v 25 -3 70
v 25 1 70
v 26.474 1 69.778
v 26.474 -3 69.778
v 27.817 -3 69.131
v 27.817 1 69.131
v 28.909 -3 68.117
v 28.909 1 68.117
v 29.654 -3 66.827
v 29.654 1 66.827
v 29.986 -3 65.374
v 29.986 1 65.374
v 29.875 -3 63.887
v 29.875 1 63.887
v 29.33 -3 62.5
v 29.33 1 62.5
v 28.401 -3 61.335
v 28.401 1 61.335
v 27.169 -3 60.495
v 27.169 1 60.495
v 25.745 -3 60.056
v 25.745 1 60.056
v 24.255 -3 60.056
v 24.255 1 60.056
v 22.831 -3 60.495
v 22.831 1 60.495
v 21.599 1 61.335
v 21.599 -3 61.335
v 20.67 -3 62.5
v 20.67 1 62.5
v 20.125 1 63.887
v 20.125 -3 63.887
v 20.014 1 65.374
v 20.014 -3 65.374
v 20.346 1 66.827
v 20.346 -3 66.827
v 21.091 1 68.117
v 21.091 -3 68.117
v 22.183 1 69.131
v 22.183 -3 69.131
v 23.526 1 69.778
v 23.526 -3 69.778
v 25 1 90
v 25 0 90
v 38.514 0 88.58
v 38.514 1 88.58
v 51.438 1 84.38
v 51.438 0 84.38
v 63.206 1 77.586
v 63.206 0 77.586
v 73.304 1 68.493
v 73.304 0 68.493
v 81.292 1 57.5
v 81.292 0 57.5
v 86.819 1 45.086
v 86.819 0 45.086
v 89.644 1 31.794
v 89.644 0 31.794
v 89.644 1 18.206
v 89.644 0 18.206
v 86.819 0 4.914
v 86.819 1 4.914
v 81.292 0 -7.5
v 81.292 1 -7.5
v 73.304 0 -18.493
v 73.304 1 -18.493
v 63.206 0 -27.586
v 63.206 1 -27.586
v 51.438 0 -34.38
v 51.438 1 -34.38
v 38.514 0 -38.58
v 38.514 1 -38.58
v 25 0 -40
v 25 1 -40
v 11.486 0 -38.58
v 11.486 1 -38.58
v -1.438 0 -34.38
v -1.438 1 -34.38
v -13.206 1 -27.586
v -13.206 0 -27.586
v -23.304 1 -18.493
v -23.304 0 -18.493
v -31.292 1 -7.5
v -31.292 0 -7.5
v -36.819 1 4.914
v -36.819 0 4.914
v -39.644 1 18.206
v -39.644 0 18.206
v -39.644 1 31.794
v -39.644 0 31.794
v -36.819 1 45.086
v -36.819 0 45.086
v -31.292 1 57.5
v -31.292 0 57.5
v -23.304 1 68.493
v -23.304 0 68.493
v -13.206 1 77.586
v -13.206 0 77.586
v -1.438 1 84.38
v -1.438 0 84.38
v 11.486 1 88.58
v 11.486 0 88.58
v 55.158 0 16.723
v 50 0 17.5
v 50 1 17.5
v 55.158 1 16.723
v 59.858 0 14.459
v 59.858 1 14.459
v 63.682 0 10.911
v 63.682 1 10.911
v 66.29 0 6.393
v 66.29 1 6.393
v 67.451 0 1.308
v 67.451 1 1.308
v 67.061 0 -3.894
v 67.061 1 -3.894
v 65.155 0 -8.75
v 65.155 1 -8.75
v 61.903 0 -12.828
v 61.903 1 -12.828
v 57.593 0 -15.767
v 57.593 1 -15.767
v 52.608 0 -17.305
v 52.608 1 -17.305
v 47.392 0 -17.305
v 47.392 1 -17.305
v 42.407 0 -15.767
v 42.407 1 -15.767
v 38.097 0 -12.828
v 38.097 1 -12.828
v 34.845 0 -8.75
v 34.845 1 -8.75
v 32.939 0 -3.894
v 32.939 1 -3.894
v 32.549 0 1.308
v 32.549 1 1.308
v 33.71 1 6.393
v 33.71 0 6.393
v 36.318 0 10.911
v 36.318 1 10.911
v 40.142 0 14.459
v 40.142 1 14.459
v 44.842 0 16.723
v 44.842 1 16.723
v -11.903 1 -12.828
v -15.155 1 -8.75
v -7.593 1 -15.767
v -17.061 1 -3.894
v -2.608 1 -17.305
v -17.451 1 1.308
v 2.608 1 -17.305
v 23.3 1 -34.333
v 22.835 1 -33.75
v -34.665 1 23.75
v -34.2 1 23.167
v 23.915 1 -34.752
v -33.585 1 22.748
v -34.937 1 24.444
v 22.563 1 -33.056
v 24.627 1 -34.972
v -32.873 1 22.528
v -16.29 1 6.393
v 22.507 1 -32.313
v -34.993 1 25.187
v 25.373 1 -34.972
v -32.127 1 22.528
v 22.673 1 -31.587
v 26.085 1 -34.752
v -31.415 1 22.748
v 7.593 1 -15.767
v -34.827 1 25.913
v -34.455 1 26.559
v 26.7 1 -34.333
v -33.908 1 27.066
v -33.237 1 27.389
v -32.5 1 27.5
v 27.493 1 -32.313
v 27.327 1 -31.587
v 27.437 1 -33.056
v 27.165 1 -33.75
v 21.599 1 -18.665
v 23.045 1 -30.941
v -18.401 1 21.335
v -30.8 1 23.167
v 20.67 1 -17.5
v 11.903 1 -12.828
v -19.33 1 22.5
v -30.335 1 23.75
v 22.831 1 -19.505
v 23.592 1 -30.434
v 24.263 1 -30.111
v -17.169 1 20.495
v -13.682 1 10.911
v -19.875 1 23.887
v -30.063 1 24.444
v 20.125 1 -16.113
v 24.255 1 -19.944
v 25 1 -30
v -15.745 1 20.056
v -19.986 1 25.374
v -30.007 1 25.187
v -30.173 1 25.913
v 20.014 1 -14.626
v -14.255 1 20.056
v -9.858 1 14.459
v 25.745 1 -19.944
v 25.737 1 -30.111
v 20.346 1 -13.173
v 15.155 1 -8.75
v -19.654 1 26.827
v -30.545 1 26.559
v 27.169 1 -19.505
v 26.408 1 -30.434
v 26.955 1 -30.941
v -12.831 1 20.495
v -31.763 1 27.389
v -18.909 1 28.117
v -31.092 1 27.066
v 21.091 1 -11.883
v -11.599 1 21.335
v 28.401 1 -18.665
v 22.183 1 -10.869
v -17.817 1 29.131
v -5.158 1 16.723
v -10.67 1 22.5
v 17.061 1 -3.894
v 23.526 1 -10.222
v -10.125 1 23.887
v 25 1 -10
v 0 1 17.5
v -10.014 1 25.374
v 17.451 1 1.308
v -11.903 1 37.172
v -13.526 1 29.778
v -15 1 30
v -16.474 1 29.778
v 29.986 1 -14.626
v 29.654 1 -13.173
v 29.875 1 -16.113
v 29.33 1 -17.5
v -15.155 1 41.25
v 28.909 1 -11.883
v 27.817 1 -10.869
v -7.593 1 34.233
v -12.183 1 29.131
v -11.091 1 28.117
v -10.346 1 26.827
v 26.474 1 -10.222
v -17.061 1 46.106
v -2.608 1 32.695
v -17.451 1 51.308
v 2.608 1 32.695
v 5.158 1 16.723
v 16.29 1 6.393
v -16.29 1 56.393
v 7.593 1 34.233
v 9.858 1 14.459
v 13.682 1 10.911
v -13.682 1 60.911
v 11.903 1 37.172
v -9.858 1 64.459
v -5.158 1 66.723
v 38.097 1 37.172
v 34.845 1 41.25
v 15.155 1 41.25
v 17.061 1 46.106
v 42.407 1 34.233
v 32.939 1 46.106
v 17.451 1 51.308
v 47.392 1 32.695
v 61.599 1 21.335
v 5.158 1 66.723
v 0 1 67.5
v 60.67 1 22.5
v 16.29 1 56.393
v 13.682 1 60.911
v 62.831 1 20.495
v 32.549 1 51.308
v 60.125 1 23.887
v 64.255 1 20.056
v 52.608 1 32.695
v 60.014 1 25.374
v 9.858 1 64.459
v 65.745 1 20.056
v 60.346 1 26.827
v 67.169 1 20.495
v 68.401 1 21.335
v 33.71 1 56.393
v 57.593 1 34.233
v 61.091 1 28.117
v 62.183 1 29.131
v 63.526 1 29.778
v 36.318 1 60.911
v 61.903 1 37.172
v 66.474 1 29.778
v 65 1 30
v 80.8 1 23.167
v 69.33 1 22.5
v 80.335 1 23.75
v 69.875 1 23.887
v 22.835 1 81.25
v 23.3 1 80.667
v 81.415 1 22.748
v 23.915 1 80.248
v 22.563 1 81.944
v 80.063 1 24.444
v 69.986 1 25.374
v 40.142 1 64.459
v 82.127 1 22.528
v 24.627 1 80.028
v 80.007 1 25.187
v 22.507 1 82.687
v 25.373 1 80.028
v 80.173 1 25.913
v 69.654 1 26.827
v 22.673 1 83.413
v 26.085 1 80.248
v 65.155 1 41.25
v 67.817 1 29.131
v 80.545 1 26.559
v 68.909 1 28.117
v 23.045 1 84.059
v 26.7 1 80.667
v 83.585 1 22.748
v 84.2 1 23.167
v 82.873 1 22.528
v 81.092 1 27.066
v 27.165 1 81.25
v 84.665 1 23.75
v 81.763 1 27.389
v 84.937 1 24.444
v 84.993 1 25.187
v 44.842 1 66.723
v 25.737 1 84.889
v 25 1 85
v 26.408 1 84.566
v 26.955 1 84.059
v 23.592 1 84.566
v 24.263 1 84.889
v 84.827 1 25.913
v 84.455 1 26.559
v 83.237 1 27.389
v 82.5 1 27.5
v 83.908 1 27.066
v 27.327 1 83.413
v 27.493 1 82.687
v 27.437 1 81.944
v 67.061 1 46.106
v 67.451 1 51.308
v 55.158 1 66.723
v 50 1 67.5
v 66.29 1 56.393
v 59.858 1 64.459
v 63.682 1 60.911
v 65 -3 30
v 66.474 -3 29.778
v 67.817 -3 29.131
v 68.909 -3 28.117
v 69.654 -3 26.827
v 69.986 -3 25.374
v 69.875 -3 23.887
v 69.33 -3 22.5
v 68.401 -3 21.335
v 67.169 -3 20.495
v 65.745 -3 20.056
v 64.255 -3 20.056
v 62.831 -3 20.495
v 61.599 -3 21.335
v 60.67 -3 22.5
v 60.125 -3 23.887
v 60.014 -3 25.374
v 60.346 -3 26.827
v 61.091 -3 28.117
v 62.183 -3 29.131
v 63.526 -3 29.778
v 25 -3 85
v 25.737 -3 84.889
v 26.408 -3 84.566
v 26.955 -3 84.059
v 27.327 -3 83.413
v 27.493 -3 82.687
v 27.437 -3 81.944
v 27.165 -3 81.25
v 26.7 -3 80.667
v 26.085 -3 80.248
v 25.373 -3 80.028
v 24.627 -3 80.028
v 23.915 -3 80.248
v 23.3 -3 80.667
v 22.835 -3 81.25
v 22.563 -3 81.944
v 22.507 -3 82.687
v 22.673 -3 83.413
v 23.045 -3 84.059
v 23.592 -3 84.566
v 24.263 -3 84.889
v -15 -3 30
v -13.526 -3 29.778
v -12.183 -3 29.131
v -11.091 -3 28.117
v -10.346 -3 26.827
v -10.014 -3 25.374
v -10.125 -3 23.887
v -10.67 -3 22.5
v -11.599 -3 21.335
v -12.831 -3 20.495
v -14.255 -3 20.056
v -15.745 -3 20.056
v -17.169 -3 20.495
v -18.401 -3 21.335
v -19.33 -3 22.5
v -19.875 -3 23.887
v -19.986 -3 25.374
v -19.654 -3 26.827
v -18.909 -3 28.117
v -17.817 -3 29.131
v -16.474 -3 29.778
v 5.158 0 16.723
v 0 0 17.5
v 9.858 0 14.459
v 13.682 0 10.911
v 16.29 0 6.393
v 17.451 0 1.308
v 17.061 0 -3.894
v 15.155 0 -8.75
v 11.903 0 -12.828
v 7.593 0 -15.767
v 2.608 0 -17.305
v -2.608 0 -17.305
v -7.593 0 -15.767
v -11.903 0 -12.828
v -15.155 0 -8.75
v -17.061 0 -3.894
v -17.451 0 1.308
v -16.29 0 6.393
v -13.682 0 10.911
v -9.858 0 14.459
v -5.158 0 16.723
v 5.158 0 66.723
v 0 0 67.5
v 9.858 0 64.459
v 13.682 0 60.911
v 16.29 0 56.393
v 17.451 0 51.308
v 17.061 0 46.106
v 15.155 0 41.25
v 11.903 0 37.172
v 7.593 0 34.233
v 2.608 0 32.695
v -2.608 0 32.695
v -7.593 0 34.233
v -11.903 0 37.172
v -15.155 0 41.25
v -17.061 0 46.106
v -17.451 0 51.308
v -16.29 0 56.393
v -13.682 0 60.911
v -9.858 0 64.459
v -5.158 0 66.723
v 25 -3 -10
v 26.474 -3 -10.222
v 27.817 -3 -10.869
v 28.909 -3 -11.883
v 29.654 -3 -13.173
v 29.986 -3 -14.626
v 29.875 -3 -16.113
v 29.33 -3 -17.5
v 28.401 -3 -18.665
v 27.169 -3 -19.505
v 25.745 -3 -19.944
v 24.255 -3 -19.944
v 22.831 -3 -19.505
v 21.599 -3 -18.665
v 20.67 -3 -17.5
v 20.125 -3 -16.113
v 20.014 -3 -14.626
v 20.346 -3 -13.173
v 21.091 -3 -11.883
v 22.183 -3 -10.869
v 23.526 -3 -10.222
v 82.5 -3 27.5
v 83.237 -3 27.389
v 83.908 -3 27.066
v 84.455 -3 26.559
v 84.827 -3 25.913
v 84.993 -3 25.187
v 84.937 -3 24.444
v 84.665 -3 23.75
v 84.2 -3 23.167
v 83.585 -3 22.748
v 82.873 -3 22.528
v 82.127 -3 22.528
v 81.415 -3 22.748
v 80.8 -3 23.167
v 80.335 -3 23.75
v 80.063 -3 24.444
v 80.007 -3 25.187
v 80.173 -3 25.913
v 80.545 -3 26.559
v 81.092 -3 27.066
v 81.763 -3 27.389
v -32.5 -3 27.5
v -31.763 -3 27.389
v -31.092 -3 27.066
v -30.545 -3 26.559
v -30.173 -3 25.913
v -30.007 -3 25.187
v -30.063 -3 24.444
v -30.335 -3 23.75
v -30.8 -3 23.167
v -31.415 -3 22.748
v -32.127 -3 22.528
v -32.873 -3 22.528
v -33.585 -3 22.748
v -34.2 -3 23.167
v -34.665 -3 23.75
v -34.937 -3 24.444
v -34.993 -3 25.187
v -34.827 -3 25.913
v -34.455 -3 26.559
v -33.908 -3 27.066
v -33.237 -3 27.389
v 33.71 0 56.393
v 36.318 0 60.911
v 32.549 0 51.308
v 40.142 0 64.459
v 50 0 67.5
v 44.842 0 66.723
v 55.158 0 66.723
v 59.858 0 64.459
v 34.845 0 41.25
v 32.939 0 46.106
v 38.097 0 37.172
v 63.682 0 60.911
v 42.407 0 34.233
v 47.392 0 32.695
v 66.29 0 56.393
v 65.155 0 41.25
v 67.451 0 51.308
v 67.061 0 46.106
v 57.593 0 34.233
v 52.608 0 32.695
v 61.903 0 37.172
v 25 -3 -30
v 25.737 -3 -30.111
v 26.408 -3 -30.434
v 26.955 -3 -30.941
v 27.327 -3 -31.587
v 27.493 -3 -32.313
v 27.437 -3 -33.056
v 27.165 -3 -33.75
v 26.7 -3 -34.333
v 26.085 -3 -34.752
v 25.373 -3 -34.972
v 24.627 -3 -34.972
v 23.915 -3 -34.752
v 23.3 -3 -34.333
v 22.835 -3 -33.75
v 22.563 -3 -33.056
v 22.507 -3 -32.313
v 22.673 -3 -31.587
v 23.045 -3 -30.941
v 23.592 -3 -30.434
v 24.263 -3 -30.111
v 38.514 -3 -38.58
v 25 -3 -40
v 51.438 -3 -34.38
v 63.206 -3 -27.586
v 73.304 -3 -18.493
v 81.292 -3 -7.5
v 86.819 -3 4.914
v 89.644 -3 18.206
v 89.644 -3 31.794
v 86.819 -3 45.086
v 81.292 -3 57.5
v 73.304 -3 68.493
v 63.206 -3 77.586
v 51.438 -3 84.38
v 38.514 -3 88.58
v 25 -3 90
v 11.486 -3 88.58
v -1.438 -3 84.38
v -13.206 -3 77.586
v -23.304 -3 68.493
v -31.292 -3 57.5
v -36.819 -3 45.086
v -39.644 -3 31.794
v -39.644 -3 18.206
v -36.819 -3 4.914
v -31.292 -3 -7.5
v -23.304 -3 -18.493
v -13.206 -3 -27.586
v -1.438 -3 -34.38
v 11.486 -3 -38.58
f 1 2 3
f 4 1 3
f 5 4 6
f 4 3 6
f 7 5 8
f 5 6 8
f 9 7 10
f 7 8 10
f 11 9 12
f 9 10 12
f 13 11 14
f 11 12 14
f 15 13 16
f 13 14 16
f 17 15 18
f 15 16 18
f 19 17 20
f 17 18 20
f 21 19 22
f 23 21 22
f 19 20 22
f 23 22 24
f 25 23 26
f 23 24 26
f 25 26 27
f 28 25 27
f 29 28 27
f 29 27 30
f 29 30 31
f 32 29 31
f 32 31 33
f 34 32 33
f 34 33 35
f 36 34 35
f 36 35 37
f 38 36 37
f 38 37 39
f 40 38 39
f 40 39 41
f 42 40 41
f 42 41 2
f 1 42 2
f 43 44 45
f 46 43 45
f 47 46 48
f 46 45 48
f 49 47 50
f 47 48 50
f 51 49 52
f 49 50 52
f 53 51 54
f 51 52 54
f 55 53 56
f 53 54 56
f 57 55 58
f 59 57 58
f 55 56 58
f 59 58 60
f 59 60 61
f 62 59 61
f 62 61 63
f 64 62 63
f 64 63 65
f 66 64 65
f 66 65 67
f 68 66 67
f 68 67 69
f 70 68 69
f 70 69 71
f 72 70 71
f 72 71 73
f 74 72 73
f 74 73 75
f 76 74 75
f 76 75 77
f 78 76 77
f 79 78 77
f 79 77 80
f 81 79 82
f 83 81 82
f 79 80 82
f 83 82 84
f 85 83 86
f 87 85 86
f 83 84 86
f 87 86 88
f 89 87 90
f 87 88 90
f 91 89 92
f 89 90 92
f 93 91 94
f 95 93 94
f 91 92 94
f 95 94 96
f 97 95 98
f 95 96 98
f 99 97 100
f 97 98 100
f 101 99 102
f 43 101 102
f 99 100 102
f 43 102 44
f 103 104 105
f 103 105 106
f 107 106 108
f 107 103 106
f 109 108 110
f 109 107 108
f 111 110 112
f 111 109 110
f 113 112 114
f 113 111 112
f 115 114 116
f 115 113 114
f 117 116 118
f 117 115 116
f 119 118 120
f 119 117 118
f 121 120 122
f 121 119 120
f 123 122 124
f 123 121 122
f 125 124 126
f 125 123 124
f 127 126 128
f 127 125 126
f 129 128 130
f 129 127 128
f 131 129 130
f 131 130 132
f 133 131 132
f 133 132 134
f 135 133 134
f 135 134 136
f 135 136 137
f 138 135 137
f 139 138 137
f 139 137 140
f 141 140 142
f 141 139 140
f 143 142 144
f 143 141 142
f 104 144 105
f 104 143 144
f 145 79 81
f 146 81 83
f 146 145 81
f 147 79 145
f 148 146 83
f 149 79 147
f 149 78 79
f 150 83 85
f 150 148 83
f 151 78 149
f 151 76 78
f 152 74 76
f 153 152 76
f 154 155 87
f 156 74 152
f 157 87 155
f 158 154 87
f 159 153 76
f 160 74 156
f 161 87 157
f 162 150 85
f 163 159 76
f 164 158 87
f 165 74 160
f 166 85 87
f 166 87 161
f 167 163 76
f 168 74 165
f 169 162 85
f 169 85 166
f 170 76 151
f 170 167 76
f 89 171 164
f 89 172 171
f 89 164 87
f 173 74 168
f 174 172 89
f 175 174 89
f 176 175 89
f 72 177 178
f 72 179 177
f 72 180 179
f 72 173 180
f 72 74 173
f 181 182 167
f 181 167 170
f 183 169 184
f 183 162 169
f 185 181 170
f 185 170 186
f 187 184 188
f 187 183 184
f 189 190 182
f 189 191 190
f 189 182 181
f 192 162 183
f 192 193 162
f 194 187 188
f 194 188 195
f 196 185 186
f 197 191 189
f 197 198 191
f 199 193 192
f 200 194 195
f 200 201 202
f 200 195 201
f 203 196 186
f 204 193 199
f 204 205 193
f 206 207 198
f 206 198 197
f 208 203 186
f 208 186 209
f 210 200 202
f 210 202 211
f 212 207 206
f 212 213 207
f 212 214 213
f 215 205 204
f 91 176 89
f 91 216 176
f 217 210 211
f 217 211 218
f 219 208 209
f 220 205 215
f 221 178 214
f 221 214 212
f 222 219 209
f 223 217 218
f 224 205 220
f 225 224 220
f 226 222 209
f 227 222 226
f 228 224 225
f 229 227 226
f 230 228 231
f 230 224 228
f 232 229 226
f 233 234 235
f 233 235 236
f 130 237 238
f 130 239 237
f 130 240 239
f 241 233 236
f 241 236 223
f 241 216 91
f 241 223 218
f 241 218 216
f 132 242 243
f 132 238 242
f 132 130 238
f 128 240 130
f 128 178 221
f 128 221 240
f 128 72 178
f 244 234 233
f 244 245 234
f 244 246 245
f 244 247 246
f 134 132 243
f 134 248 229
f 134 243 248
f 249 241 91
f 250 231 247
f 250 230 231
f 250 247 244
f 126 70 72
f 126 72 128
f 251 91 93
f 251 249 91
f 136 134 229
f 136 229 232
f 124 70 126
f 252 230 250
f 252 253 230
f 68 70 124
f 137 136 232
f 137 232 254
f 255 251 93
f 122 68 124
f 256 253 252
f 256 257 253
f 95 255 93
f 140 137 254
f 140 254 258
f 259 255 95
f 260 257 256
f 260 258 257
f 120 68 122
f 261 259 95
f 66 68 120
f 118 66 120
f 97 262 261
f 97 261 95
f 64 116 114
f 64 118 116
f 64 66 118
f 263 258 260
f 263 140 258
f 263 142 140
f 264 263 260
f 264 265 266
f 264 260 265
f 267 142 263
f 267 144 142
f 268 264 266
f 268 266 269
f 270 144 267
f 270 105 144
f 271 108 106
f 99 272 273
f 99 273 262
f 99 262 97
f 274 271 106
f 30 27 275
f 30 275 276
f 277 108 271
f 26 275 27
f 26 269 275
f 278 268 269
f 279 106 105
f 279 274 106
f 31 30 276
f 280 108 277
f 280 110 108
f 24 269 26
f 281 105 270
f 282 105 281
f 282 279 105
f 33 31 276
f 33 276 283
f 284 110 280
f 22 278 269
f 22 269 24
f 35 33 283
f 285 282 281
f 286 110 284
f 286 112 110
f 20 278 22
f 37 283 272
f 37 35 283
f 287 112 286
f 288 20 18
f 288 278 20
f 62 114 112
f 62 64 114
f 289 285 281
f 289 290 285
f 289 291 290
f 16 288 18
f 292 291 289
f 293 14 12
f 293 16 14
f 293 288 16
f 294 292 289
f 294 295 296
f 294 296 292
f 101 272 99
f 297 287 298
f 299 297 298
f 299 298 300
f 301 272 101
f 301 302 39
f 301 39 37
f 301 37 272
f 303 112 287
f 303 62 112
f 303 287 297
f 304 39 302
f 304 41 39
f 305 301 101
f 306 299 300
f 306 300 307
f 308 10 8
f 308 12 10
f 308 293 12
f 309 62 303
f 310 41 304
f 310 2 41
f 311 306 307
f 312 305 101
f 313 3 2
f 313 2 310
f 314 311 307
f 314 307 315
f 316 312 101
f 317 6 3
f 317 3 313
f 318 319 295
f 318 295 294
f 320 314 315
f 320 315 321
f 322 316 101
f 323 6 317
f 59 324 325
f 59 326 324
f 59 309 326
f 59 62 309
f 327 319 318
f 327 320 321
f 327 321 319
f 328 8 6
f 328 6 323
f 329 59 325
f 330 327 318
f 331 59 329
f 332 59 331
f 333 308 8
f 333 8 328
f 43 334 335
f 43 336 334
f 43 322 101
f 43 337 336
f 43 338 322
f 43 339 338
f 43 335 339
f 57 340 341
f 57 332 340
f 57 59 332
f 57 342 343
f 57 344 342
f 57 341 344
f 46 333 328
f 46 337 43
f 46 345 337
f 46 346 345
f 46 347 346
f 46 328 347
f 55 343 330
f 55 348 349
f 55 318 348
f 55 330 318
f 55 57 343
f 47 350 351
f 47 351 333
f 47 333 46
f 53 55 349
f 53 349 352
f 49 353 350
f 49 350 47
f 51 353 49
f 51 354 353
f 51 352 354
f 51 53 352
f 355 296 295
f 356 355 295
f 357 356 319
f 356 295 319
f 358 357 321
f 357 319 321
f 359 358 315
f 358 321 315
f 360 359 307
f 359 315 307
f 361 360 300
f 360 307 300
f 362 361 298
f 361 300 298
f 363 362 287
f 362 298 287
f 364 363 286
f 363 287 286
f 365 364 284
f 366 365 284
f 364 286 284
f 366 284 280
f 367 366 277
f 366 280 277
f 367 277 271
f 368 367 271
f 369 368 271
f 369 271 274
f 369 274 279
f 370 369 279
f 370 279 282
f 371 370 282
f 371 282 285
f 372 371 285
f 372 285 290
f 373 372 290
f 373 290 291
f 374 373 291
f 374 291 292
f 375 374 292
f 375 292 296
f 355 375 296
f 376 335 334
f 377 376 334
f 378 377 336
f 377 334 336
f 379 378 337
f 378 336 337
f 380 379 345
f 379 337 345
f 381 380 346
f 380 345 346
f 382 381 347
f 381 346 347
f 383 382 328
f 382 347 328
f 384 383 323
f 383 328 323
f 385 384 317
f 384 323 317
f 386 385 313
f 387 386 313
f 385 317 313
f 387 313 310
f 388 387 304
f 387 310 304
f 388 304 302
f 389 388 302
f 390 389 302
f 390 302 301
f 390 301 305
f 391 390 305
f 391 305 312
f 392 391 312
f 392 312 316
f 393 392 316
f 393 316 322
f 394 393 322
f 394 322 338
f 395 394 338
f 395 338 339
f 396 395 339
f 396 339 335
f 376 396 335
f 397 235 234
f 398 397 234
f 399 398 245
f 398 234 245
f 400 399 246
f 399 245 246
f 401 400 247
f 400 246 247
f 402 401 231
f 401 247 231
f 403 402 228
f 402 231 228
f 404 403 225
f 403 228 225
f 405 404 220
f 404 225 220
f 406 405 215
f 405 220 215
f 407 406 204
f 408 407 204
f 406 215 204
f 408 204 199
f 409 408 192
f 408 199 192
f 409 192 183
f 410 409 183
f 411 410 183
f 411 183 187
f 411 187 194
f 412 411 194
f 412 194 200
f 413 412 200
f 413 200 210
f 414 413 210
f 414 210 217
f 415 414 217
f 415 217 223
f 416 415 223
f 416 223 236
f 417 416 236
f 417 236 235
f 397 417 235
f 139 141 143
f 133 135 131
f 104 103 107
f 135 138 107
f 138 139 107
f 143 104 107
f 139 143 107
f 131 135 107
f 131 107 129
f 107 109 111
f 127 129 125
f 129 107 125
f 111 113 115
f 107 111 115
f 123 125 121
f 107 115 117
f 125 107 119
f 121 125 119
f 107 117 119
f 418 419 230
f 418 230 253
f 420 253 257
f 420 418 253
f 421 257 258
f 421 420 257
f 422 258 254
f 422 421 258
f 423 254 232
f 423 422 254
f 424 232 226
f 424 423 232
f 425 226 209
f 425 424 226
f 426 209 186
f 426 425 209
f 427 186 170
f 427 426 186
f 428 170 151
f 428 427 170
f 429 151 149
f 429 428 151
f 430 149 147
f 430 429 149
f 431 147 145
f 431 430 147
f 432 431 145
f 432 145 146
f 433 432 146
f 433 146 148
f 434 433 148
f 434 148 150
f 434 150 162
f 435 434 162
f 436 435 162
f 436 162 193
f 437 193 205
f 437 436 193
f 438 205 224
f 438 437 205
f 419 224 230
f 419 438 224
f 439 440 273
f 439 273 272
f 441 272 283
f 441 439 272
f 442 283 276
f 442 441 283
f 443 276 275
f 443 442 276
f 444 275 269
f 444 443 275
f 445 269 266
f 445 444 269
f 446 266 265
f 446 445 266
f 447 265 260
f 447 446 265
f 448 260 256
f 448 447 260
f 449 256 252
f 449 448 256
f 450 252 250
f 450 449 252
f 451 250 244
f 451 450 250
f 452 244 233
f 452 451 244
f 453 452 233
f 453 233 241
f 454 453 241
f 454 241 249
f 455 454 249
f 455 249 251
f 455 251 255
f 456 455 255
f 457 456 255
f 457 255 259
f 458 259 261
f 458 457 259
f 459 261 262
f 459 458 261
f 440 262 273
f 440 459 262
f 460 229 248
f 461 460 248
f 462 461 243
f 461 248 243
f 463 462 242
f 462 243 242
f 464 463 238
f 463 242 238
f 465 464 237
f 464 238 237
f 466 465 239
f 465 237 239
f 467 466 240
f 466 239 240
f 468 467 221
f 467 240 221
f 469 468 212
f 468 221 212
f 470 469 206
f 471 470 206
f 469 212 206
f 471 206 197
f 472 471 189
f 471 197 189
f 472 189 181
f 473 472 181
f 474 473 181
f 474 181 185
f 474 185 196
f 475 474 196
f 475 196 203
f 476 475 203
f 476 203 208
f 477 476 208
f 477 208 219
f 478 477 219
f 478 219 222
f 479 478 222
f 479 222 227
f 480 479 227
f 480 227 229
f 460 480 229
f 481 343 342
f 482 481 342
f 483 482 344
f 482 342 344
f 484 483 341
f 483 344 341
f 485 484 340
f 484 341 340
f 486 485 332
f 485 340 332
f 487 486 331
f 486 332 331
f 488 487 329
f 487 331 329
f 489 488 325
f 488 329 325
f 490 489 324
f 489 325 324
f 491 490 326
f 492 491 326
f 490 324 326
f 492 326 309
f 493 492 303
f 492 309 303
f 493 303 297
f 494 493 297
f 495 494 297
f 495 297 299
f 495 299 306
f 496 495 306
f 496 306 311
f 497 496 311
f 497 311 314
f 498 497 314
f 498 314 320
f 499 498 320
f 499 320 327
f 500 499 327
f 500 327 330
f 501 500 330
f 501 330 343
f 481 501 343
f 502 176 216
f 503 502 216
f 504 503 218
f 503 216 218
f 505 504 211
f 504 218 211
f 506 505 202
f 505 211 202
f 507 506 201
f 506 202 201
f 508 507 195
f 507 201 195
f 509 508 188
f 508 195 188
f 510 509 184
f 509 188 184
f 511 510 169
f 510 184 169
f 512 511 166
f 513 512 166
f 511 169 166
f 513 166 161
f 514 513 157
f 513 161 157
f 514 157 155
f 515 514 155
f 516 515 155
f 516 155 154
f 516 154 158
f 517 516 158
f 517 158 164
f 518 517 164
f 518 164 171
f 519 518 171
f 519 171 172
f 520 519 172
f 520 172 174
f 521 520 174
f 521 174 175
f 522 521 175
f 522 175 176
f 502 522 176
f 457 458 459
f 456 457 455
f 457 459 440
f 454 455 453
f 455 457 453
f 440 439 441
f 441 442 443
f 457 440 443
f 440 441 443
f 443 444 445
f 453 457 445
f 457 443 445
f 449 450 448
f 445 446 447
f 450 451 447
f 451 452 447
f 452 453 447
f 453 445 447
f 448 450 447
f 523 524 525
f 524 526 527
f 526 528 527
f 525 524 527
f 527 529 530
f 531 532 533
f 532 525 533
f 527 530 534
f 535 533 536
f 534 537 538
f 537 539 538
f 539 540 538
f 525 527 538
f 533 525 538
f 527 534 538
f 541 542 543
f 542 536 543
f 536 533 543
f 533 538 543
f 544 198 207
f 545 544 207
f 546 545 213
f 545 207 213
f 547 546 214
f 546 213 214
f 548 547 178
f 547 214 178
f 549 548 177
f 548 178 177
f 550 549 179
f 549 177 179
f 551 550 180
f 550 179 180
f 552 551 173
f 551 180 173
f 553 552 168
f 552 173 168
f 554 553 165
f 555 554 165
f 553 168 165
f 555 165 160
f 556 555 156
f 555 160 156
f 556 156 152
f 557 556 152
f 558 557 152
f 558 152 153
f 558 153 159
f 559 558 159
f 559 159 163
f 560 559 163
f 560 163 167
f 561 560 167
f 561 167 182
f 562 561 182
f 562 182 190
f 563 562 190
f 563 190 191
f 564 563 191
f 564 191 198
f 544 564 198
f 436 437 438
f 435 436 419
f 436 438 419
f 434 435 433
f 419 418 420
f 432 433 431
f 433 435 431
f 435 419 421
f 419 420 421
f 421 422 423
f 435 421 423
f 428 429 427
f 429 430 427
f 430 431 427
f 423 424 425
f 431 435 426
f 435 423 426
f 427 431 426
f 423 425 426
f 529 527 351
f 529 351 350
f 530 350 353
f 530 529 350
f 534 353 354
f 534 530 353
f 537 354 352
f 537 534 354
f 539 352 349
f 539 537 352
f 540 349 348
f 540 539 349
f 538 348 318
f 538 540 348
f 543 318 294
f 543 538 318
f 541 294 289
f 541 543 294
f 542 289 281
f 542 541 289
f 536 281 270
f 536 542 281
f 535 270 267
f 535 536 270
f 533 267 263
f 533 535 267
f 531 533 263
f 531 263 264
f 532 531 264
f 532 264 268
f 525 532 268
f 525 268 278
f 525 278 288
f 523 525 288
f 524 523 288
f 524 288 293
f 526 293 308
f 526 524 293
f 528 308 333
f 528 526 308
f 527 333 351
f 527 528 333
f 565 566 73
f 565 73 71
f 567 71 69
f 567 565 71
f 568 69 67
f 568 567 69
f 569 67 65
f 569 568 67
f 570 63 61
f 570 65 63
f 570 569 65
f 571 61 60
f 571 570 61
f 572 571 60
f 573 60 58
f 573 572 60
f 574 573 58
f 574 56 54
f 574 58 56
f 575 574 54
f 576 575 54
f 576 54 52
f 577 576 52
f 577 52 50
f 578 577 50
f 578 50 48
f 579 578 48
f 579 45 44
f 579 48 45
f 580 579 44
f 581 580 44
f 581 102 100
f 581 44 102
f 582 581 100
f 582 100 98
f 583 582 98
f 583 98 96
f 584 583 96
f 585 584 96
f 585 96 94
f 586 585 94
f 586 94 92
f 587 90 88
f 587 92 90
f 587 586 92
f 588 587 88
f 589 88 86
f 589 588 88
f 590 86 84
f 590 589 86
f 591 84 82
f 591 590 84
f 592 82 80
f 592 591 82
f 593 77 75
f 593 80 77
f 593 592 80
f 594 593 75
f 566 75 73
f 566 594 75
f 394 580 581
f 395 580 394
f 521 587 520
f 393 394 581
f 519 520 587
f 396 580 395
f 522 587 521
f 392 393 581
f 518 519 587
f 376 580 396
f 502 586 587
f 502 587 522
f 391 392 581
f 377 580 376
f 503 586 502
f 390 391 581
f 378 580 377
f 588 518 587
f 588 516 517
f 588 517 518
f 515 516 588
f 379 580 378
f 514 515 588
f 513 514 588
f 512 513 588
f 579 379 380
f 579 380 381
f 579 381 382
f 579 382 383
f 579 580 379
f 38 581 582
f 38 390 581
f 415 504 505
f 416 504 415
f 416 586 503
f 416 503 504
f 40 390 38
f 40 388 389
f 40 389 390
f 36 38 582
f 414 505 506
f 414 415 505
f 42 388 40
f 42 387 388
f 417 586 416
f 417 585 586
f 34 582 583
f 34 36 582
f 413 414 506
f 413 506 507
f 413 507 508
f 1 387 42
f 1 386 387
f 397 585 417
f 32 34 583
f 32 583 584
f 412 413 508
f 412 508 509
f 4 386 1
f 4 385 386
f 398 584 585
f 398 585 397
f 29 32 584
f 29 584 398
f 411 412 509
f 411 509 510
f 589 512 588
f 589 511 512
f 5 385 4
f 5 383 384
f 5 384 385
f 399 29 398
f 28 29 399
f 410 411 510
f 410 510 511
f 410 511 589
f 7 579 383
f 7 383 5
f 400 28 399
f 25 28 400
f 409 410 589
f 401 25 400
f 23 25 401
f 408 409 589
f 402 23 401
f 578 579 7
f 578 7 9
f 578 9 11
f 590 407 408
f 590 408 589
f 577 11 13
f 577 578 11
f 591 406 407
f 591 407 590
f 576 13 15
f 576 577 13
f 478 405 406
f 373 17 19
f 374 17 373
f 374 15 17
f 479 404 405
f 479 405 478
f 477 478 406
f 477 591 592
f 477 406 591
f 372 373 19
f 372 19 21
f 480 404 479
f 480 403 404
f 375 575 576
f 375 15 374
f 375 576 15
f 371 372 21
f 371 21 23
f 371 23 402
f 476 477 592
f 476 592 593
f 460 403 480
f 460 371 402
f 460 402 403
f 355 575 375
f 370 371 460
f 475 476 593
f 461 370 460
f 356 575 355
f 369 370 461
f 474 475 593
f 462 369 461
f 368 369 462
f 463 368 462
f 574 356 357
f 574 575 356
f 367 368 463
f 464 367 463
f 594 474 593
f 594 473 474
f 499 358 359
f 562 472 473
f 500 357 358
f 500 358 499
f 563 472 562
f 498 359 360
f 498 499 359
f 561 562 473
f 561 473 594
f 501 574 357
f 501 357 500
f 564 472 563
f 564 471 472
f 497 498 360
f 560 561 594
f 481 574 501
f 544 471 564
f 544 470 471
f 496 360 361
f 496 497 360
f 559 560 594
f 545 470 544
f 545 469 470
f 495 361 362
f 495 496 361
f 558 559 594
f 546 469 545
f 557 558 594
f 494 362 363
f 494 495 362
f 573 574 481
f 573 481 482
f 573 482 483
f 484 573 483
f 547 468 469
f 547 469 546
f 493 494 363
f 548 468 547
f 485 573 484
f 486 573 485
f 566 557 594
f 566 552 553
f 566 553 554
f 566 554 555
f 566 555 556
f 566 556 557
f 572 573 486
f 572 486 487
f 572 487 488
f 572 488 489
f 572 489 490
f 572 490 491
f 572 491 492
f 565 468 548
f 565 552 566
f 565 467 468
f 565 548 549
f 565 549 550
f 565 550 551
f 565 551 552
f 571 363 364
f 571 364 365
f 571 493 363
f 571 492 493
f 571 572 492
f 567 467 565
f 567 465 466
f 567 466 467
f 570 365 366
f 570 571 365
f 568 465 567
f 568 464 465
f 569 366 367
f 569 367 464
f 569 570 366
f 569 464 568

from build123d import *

# Parameters (mm, degrees)
SKETCH1_R           = 65
SKETCH1_R_2         = 17.5
BOSS_EXTRUDE2_DEPTH = 1
BOSS_EXTRUDE3_START = 3
SKETCH2_R           = 65
BOSS_EXTRUDE3_DEPTH = 3
SKETCH3_R           = 5
CUT_EXTRUDE1_DEPTH  = 128.342059038
SKETCH4_R           = 2.5
CUT_EXTRUDE2_DEPTH  = 128.342059038


with BuildPart() as part:
    # Sketch1 → Boss-Extrude2 (new body)
    with BuildSketch(Plane(origin=(0, 0, 0), x_dir=(1, 0, 0), z_dir=(0, 1, 0))):
        with Locations(Location((25, -25, 0), (0, 0, 270))):
            Circle(SKETCH1_R)
        with Locations(Location((0, 0, 0), (0, 0, 270))):
            Circle(SKETCH1_R_2, mode=Mode.SUBTRACT)
        with Locations(Location((50, 0, 0), (0, 0, 270))):
            Circle(SKETCH1_R_2, mode=Mode.SUBTRACT)
        with Locations(Location((50, -50, 0), (0, 0, 270))):
            Circle(SKETCH1_R_2, mode=Mode.SUBTRACT)
        with Locations(Location((0, -50, 0), (0, 0, 270))):
            Circle(SKETCH1_R_2, mode=Mode.SUBTRACT)
    extrude(amount=BOSS_EXTRUDE2_DEPTH)

    # Sketch2 → Boss-Extrude3 (add)
    with BuildSketch(Plane.XZ.offset(BOSS_EXTRUDE3_START)):
        with Locations(Location((25, 25, 0), (0, 0, 270))):
            Circle(SKETCH2_R)
    extrude(amount=-BOSS_EXTRUDE3_DEPTH)

    # Sketch3 → Cut-Extrude1 (cut, through all)
    with BuildSketch(Plane(origin=(0, 1, 0), x_dir=(1, 0, 0), z_dir=(0, 1, 0))):
        with Locations(Location((25, 15, 0), (0, 0, 270))):
            Circle(SKETCH3_R)
        with Locations(Location((65, -25, 0), (0, 0, 270))):
            Circle(SKETCH3_R)
        with Locations(Location((25, -65, 0), (0, 0, 270))):
            Circle(SKETCH3_R)
        with Locations(Location((-15, -25, 0), (0, 0, 270))):
            Circle(SKETCH3_R)
    extrude(amount=-CUT_EXTRUDE1_DEPTH, mode=Mode.SUBTRACT)

    # Sketch4 → Cut-Extrude2 (cut, through all)
    with BuildSketch(Plane(origin=(0, 1, 0), x_dir=(1, 0, 0), z_dir=(0, 1, 0))):
        with Locations(Location((25, 32.5, 0), (0, 0, 270))):
            Circle(SKETCH4_R)
        with Locations(Location((82.5, -25, 0), (0, 0, 270))):
            Circle(SKETCH4_R)
        with Locations(Location((25, -82.5, 0), (0, 0, 270))):
            Circle(SKETCH4_R)
        with Locations(Location((-32.5, -25, 0), (0, 0, 270))):
            Circle(SKETCH4_R)
    extrude(amount=-CUT_EXTRUDE2_DEPTH, mode=Mode.SUBTRACT)


solid = part.part
